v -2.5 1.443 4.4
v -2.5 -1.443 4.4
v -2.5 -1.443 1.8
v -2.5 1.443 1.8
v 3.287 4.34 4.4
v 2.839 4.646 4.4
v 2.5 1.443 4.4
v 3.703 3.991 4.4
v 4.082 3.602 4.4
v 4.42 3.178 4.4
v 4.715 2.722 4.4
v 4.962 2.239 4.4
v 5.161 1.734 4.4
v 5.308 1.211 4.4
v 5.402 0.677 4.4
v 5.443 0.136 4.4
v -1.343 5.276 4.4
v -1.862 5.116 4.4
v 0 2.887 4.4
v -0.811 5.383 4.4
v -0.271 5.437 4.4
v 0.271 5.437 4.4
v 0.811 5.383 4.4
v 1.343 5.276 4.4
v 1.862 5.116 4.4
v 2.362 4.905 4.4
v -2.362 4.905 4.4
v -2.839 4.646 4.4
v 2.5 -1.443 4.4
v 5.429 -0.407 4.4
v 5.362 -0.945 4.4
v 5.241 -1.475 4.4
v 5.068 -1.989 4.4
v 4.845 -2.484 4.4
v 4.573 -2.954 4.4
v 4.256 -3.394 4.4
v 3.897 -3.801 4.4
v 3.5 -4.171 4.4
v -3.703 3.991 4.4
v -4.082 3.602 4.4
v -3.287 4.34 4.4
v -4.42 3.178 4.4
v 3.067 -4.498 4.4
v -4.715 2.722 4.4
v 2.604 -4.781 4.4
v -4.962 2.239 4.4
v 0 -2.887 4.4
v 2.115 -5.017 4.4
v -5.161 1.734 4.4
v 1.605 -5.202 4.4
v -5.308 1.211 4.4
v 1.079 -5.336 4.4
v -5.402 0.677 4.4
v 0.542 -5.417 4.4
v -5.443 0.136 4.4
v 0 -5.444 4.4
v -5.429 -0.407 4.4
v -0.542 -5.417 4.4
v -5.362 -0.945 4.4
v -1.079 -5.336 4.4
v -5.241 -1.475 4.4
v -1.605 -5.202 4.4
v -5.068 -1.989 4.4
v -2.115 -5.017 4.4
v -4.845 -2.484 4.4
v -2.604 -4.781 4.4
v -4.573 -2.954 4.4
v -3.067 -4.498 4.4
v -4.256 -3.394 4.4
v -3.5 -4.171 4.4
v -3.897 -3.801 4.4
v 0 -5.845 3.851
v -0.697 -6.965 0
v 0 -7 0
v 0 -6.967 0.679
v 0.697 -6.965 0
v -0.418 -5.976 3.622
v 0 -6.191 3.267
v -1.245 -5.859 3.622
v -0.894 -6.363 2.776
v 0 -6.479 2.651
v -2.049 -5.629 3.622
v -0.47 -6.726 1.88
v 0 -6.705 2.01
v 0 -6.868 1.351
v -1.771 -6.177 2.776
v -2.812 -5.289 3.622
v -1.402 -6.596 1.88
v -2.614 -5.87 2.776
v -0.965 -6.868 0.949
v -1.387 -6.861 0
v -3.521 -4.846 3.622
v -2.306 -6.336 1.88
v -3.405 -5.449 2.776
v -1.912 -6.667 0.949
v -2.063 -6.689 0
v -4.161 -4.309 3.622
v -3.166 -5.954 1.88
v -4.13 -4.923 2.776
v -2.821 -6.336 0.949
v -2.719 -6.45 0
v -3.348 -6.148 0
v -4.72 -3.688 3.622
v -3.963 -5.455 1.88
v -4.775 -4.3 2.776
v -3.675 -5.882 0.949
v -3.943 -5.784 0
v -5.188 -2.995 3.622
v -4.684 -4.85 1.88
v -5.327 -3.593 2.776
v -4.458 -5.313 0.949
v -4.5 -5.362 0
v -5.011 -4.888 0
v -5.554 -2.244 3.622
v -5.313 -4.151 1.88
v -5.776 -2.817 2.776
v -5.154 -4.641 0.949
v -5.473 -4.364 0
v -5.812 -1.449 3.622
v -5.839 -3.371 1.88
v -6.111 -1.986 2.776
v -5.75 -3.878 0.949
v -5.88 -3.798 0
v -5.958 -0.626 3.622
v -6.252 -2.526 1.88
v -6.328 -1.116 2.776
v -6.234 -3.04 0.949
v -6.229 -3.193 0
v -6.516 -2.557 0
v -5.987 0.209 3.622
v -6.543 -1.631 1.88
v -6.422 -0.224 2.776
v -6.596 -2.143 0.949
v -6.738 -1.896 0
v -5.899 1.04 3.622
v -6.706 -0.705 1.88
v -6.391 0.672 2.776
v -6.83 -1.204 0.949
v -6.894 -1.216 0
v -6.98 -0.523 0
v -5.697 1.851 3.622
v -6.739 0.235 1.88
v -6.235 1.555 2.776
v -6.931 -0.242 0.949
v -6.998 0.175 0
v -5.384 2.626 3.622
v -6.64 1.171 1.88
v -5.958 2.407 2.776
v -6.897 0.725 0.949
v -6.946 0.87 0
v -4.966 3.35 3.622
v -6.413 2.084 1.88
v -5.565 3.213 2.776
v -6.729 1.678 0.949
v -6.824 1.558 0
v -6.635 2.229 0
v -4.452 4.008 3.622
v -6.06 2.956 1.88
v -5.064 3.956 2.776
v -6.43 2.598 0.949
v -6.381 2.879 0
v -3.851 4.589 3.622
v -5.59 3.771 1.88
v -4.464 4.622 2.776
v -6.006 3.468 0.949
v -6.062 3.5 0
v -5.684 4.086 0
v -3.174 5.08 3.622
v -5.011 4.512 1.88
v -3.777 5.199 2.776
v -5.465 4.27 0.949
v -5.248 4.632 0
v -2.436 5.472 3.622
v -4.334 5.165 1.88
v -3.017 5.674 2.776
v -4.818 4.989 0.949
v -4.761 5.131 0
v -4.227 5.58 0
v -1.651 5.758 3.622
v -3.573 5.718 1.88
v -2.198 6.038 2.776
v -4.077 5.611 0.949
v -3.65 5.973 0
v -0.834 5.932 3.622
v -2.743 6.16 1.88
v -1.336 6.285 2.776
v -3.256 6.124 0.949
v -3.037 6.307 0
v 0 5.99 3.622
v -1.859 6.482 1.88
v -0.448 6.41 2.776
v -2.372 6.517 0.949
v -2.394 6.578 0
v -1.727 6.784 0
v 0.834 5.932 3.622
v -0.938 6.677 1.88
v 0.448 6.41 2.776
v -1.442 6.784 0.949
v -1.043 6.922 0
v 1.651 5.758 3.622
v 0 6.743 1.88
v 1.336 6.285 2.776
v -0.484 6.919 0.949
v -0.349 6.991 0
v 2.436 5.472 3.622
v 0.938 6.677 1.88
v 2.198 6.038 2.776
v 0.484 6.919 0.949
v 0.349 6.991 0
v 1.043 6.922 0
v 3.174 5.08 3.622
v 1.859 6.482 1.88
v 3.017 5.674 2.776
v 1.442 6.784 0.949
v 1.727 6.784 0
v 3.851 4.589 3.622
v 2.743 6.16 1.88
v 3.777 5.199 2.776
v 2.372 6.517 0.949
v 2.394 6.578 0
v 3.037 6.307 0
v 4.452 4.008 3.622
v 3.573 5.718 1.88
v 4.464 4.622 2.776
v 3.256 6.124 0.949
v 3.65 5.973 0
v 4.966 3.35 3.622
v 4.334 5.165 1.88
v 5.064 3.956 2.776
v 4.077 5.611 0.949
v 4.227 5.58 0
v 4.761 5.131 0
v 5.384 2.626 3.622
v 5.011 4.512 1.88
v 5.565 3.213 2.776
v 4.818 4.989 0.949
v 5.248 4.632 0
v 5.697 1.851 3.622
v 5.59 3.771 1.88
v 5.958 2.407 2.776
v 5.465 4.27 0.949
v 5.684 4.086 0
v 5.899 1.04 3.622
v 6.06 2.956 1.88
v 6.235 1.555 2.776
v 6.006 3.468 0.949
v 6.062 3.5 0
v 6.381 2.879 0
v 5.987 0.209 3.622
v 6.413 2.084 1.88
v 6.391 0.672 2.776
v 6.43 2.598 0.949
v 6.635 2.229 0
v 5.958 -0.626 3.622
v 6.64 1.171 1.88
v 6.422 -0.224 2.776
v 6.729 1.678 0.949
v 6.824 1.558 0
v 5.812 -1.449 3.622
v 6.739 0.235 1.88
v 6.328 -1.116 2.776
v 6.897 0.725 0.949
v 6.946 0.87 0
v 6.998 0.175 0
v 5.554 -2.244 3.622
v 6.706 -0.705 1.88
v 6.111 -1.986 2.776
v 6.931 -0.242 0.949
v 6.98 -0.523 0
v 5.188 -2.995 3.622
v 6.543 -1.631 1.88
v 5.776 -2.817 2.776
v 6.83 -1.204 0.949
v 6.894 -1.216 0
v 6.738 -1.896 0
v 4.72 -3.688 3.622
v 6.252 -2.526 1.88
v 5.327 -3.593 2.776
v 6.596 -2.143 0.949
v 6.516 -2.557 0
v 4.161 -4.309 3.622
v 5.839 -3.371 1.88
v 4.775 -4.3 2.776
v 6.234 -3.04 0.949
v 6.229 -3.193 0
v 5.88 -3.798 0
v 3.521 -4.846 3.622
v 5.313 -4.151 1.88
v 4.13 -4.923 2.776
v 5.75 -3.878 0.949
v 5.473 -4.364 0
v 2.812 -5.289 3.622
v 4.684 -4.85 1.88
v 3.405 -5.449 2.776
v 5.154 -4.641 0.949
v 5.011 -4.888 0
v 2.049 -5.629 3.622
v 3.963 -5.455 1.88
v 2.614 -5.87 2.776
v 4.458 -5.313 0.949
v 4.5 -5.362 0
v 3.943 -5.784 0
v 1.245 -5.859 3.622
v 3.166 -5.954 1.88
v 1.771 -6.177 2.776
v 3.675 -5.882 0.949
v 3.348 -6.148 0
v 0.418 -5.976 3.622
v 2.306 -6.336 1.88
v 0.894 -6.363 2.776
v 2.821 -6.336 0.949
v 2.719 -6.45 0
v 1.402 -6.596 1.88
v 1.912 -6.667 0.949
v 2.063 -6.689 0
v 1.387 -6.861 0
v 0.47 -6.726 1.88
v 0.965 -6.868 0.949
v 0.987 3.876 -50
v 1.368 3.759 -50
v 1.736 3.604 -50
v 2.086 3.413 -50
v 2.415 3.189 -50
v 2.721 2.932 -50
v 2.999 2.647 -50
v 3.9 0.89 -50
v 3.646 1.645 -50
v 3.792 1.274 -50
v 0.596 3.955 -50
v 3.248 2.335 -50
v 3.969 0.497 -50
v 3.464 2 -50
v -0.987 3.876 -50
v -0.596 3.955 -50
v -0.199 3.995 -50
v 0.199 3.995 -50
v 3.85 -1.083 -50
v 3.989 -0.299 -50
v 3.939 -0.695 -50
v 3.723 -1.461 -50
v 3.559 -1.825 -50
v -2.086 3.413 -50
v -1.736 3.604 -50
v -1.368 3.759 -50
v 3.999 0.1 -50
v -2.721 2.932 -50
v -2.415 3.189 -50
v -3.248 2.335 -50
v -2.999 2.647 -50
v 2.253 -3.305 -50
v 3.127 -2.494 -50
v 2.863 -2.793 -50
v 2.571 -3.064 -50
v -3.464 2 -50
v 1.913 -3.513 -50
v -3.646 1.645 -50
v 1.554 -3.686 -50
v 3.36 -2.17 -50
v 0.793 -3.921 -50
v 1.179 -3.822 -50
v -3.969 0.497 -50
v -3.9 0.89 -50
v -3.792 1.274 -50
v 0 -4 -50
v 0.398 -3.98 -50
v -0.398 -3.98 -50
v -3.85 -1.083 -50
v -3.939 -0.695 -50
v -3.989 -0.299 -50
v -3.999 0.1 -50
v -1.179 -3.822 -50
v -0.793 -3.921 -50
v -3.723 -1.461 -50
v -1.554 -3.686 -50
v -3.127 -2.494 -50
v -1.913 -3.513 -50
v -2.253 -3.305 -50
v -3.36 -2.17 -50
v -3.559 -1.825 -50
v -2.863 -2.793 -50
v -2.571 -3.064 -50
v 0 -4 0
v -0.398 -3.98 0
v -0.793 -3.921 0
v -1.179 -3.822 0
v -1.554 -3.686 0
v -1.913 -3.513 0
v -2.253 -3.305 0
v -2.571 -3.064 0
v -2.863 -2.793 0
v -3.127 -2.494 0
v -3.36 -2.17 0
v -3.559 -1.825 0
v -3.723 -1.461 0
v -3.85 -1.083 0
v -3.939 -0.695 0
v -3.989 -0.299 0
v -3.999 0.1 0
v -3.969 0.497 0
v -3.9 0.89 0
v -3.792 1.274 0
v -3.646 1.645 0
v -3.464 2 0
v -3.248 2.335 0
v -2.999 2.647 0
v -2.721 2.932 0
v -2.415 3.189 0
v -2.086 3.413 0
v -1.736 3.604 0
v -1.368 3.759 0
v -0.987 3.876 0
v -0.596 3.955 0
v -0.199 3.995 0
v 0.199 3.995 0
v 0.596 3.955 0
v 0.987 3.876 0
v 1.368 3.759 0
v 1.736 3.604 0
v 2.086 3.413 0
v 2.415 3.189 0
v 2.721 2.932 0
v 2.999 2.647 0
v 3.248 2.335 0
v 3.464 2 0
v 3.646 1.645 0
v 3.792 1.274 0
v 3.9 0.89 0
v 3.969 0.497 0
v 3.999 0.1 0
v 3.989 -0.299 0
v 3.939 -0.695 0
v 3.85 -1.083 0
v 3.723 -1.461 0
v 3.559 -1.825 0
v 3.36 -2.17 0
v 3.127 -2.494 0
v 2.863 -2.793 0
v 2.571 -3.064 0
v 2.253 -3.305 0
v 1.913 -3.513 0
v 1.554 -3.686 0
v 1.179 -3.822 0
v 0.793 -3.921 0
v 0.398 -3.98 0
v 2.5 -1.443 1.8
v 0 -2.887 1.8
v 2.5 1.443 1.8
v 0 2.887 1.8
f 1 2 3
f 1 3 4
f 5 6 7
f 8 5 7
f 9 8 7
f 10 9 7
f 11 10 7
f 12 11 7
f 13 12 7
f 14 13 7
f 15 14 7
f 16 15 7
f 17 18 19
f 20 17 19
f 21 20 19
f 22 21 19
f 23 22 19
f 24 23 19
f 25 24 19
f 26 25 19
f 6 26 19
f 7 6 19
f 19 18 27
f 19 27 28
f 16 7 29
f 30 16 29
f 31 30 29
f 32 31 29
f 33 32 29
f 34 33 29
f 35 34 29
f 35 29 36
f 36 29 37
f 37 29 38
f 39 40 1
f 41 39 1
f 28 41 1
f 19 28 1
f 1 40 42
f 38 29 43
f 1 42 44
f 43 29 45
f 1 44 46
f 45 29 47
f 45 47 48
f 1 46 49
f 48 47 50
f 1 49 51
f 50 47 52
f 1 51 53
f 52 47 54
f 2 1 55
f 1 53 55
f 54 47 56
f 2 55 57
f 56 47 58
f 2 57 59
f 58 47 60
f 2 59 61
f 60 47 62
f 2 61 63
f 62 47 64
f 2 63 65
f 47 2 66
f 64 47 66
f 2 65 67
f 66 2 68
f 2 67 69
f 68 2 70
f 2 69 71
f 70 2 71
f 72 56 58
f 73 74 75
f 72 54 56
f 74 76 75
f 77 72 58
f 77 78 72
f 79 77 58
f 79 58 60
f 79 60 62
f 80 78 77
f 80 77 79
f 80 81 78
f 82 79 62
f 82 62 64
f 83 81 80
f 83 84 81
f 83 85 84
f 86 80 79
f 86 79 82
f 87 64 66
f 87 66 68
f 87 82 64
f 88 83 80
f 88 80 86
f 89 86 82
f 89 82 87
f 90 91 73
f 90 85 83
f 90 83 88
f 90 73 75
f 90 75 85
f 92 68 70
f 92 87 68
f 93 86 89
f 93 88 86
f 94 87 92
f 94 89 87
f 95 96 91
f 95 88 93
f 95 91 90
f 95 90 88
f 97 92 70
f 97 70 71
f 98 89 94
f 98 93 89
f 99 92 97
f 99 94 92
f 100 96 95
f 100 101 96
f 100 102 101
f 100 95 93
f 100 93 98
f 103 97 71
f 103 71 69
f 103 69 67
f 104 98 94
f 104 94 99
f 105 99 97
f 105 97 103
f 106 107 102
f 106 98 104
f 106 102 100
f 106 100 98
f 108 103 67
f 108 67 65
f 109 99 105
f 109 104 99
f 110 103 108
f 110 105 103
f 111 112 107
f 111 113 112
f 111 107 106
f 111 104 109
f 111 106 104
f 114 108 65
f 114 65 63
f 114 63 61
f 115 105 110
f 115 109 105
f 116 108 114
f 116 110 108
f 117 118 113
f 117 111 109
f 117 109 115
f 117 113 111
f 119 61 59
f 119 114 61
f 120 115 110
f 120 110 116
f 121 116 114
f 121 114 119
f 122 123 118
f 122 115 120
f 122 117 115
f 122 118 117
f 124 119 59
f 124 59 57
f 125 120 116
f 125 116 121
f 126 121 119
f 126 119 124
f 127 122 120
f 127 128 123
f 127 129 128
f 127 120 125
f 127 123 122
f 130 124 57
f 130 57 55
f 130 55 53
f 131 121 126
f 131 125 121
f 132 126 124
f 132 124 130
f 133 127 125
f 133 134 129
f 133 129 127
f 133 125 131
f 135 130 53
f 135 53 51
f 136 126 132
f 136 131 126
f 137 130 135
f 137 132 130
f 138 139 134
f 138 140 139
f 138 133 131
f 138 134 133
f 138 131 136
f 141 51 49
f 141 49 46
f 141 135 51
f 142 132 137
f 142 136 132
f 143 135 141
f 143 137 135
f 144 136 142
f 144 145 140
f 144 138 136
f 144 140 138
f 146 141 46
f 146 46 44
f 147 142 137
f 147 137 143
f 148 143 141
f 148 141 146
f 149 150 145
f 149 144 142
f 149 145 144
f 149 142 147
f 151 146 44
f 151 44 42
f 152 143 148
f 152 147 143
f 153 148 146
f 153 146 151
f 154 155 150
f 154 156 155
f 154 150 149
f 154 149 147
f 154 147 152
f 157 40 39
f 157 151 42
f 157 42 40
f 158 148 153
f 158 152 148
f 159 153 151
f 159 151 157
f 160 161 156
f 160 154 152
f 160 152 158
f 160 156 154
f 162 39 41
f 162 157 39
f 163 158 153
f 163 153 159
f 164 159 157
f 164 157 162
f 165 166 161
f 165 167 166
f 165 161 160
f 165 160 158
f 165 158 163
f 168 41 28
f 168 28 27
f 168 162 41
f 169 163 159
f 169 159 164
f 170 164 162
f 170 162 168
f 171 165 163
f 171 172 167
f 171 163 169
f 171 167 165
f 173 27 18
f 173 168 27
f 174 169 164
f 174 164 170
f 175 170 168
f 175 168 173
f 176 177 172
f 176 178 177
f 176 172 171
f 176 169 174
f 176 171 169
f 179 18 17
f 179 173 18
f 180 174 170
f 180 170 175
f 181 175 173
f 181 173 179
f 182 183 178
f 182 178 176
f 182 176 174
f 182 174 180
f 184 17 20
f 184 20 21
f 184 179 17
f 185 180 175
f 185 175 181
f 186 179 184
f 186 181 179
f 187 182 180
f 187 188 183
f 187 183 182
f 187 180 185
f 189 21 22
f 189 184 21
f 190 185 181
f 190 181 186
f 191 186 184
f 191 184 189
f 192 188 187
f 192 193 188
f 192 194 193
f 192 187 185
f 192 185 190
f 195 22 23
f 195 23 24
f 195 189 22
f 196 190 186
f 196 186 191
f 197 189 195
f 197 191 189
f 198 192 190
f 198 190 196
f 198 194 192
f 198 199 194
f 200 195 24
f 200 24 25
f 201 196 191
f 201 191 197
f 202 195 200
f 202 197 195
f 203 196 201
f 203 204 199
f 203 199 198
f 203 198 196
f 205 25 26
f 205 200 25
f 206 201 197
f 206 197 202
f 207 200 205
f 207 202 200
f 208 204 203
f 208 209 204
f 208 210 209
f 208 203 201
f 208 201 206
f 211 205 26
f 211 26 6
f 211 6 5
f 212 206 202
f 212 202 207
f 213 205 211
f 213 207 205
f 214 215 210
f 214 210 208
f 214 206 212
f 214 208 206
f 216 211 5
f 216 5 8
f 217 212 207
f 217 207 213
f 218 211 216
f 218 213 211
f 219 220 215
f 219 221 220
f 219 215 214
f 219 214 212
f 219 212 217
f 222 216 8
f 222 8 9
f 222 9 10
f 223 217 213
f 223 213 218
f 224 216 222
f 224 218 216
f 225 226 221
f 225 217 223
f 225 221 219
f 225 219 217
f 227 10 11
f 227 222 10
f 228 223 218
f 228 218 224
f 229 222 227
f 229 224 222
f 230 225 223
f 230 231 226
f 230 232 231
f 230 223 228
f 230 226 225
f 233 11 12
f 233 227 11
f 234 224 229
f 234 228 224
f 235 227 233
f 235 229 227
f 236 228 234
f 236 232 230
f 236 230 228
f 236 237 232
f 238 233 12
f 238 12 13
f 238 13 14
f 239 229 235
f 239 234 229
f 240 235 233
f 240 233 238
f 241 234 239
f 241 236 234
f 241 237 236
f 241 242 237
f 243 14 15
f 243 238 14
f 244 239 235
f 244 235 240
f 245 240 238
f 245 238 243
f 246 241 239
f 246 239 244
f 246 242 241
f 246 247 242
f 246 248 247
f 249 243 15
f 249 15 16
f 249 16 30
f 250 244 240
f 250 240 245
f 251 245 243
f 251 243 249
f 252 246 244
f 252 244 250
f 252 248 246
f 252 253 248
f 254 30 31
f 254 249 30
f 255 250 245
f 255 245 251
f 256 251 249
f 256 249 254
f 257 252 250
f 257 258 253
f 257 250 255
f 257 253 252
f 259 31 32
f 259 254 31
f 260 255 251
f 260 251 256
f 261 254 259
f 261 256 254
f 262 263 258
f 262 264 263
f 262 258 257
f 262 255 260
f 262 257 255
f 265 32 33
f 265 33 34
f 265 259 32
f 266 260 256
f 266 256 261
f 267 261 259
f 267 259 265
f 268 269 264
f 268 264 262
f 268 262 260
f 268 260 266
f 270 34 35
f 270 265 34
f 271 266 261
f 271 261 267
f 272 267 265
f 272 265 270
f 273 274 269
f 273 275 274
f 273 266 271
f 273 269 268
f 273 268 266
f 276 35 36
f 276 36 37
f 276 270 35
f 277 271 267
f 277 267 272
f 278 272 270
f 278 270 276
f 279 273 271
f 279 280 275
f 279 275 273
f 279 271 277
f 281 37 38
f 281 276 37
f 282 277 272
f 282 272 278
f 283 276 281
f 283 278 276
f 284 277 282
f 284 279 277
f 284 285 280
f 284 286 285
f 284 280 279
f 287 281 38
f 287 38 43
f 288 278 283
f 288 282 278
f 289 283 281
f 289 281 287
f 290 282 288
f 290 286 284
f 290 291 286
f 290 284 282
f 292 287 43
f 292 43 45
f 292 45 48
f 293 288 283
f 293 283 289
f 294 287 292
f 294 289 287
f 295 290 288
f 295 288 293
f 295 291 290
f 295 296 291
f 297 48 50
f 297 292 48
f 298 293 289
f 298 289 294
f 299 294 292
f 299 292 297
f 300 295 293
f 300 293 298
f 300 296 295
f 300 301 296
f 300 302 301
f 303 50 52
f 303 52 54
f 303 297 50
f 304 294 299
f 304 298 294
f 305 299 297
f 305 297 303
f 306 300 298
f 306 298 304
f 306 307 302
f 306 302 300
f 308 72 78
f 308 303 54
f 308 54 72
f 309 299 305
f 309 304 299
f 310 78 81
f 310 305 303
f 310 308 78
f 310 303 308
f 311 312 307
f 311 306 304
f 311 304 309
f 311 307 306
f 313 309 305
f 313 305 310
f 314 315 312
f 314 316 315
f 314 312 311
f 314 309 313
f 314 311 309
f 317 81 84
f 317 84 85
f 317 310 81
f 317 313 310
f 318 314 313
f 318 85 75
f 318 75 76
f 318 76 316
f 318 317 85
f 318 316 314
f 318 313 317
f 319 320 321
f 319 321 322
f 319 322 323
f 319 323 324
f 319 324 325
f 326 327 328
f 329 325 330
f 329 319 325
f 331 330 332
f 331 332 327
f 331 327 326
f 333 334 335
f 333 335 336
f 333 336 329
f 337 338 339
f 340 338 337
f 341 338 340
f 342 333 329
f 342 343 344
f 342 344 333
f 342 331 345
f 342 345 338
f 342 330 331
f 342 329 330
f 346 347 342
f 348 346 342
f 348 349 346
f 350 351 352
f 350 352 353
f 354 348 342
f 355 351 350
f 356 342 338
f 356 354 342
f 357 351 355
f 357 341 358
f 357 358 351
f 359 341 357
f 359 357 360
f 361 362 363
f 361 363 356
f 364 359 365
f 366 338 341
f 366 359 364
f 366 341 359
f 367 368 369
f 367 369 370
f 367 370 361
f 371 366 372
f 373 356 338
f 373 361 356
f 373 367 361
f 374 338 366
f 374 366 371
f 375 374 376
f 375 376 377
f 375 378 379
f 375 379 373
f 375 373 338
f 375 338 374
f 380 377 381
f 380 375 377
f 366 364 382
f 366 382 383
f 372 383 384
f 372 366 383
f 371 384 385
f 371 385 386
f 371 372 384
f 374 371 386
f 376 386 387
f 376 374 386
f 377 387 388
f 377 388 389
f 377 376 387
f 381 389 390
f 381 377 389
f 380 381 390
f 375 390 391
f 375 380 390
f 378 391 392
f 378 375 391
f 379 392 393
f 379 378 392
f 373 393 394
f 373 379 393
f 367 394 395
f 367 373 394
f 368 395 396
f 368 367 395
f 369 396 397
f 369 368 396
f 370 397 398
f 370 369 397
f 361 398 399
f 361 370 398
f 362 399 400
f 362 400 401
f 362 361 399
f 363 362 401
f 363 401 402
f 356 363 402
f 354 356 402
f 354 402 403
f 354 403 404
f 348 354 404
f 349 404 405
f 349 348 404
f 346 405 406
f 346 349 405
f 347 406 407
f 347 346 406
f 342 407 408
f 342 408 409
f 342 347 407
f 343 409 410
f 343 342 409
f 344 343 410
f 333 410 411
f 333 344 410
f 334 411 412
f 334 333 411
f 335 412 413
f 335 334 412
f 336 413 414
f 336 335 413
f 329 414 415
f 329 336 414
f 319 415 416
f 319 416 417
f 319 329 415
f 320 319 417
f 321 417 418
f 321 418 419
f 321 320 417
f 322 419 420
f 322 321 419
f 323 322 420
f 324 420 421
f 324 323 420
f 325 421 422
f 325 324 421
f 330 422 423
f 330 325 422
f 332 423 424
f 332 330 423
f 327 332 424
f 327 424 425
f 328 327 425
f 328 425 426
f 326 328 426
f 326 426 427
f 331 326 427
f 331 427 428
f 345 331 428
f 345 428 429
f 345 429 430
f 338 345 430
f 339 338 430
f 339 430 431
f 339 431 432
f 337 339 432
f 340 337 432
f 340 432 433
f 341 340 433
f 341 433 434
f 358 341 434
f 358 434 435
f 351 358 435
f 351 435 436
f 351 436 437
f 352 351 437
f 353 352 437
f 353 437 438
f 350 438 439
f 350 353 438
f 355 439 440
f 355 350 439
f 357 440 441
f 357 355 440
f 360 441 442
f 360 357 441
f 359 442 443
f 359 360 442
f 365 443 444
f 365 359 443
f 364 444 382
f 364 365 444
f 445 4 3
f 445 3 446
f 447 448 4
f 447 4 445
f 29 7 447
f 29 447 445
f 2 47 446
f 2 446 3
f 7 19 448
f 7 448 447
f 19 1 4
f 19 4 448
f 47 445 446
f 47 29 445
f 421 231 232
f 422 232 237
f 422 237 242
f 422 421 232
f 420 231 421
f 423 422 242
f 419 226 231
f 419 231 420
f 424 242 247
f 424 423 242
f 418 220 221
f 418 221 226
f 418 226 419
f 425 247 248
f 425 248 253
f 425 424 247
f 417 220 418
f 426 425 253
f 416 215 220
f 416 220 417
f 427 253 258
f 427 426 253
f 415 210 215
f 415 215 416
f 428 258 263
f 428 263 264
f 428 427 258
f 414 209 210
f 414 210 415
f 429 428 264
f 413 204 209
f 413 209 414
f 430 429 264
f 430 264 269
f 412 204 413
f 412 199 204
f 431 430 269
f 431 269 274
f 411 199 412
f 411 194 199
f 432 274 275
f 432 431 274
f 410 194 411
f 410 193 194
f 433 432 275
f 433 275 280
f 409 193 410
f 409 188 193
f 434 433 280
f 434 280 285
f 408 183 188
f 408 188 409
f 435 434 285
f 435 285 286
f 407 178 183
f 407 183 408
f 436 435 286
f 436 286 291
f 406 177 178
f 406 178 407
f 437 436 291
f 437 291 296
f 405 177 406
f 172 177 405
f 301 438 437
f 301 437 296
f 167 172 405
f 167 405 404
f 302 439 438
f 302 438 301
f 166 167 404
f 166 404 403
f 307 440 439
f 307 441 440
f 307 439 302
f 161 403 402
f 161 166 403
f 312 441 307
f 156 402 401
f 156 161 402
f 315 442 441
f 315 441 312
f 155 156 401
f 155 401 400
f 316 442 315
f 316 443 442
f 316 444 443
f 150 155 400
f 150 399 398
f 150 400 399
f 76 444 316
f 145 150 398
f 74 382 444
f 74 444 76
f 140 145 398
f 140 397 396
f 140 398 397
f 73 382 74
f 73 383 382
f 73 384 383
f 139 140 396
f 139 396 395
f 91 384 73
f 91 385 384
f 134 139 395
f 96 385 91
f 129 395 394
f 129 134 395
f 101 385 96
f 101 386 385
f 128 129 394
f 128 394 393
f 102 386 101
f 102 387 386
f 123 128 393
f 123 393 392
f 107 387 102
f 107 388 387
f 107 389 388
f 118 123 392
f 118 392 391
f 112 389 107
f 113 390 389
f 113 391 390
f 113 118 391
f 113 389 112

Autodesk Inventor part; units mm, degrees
ref_plane "YZ Plane" through (0, 0, 0) normal (1, 0, 0) x (0, 1, 0)
ref_plane "XZ Plane" through (0, 0, 0) normal (0, 1, 0) x (-1, 0, 0)
ref_plane "XY Plane" through (0, 0, 0) normal (0, 0, 1) x (1, 0, 0)
sketch "Sketch1" plane through (0, 0, 0) normal (1, 0, 0) x (0, 1, 0)
  line L0 (0, 0) -> (-4, 0)
  line L1 (-4, 0) -> (-4, -50)
  line L2 (-4, -50) -> (0, -50)
  line L3 (0, -50) -> (0, 0)
  line L4 (0, 0) -> (-7, 0)
  line L5 (-7, 0) -> (-7, 4.4)
  line L6 (-7, 4.4) -> (0, 4.4)
  line L7 (0, 4.4) -> (0, 0)
  circle A0 centre (0, 0) radius 7
  point P0 (-5.4443, 4.4)
  dimension "d0" = 4
  dimension "d1" = 50
  dimension "d2" = 7
  dimension "d3" = 4.4
revolve "Revolution1" add sketch "Sketch1" angle 360 about axis through (0, 0, 4.4) along (0, 0, -1) contours L3 A0 L1 L0 | L0 L4 A0 L6 L7 | L3 L2 L1 A0
sketch "Sketch2" plane through (0, 0, 4.4) normal (0, 0, 1) x (1, 0, 0)
  line L0 (2.5, -1.4434) -> (0, -2.8868)
  line L1 (0, -2.8868) -> (-2.5, -1.4434)
  line L2 (-2.5, -1.4434) -> (-2.5, 1.4434)
  line L3 (-2.5, 1.4434) -> (0, 2.8868)
  line L4 (0, 2.8868) -> (2.5, 1.4434)
  line L5 (2.5, 1.4434) -> (2.5, -1.4434)
  point P0 (0, 0)
  point P1 (0, 0)
  dimension "d5" = 5
extrude "Extrusion1" cut sketch "Sketch2" against normal blind 2.6
thread "Thread1" size "M8x1.25" class "6g" standard "ANSI Metric M Profile" full length
properties part number "M8 x 50 Button Head Bolt"
